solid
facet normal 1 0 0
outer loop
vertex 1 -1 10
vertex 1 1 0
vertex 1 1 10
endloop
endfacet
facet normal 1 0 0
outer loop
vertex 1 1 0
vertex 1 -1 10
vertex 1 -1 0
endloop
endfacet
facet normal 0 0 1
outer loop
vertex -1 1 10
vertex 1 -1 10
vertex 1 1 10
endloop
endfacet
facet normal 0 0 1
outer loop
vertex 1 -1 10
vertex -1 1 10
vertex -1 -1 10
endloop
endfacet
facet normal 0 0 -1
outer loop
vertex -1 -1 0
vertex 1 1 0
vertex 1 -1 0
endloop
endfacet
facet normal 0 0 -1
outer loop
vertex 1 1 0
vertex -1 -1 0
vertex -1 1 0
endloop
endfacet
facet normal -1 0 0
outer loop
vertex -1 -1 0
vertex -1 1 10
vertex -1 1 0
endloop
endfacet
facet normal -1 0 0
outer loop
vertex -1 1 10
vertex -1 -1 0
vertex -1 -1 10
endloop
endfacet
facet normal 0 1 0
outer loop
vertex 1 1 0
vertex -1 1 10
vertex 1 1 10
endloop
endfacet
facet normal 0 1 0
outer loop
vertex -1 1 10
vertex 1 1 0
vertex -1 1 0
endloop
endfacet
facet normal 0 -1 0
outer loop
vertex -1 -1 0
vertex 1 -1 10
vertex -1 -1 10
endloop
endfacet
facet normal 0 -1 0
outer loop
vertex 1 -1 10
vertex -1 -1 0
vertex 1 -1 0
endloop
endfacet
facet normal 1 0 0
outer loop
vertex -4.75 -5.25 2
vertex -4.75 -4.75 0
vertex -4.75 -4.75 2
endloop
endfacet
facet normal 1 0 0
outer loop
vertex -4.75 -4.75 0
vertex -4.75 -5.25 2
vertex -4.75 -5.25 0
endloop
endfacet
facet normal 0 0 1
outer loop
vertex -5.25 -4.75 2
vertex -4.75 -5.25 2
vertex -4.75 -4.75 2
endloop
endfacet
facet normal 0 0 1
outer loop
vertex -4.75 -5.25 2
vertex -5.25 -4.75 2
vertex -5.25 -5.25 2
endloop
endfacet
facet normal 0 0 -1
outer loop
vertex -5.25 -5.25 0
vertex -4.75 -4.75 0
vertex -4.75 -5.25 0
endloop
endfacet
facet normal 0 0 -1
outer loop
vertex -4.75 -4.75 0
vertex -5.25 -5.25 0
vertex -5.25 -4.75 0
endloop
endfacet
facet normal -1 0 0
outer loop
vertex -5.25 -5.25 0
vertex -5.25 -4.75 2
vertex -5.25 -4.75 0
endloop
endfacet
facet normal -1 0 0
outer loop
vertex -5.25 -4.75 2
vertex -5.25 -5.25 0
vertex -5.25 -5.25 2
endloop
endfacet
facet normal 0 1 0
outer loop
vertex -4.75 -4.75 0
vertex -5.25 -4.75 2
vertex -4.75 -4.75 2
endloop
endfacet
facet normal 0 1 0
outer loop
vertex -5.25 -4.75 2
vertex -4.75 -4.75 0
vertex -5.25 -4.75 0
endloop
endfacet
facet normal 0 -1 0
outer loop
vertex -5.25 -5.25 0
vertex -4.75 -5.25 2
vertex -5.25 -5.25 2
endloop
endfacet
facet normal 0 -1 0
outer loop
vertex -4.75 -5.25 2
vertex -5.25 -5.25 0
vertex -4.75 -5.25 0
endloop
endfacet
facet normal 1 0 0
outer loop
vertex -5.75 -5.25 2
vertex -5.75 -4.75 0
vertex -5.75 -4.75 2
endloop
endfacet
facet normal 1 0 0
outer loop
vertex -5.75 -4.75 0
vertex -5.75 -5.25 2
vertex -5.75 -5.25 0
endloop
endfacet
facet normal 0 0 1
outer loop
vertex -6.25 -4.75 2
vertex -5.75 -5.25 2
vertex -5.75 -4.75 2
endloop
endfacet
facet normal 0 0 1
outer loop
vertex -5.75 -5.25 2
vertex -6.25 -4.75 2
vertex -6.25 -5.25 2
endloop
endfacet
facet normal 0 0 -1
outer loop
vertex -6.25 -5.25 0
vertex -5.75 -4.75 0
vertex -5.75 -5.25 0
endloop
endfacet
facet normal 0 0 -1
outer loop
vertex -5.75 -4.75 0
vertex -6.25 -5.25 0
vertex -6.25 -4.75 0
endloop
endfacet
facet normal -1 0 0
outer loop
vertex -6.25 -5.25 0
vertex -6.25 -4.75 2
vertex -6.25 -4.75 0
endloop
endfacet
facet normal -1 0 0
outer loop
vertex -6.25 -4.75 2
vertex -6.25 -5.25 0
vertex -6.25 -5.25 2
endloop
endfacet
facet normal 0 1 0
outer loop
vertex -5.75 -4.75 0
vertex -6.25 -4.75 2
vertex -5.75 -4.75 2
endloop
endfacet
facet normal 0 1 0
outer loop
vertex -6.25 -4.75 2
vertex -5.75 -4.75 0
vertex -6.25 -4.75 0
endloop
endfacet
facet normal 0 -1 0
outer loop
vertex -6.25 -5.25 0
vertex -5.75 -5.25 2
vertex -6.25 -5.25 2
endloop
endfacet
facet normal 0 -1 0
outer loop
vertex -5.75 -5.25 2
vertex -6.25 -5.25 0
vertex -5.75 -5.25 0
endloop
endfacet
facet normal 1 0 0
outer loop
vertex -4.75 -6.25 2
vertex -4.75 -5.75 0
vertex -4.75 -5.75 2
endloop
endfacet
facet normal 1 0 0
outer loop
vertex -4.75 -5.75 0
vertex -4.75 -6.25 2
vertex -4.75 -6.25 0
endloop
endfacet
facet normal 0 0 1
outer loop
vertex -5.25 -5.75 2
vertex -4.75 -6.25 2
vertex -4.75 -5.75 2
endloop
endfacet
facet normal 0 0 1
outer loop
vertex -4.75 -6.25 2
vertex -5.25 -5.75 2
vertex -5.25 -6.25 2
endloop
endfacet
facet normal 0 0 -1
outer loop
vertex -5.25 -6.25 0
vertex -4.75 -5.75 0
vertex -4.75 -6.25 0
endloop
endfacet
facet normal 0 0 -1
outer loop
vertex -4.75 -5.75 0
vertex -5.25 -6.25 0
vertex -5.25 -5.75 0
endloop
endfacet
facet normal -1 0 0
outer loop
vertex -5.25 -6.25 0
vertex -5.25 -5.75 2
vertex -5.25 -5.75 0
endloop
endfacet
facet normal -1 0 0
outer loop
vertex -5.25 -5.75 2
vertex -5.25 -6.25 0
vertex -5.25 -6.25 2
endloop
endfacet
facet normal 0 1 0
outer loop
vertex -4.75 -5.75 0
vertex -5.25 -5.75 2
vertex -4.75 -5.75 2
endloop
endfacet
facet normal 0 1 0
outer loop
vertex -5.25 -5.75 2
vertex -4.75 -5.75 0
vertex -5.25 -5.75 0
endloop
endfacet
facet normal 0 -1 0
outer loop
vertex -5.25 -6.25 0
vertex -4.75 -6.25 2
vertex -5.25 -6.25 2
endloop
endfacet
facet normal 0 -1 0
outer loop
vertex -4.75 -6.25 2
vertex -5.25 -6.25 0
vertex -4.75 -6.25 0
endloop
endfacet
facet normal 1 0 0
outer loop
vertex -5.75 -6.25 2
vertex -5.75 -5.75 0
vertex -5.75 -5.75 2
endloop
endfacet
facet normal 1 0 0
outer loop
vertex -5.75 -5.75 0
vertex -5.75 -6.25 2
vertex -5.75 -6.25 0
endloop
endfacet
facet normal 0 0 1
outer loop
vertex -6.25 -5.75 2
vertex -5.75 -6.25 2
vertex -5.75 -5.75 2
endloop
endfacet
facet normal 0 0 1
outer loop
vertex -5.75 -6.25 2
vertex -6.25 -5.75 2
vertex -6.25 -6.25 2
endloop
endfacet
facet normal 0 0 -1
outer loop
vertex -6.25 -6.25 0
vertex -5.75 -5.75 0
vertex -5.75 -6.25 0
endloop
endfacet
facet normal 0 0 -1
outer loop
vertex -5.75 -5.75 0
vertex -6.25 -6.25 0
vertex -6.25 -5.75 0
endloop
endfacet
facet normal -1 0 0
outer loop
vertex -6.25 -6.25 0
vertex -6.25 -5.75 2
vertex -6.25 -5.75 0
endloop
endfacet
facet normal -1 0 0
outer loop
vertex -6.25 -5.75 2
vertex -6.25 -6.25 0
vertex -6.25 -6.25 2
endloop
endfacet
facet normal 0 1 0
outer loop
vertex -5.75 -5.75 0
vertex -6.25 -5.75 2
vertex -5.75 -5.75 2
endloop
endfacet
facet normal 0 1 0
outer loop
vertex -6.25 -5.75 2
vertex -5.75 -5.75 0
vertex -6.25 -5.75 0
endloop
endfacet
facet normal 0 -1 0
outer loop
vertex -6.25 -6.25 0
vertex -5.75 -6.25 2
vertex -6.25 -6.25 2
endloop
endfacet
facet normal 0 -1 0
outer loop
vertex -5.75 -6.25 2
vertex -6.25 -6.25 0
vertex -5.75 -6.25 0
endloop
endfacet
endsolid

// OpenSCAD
translate([0, 0, 5]) color([0,1,0,0.9]) cube([2, 2, 10], center=true);
translate([-5, -5, 1]) color([1,0,0]) cube([0.5, 0.5, 2], center=true);
translate([-6, -5, 1]) color([1,0,0]) cube([0.5, 0.5, 2], center=true);
translate([-5, -6, 1]) color([1,0,0]) cube([0.5, 0.5, 2], center=true);
translate([-6, -6, 1]) color([1,0,0]) cube([0.5, 0.5, 2], center=true);
